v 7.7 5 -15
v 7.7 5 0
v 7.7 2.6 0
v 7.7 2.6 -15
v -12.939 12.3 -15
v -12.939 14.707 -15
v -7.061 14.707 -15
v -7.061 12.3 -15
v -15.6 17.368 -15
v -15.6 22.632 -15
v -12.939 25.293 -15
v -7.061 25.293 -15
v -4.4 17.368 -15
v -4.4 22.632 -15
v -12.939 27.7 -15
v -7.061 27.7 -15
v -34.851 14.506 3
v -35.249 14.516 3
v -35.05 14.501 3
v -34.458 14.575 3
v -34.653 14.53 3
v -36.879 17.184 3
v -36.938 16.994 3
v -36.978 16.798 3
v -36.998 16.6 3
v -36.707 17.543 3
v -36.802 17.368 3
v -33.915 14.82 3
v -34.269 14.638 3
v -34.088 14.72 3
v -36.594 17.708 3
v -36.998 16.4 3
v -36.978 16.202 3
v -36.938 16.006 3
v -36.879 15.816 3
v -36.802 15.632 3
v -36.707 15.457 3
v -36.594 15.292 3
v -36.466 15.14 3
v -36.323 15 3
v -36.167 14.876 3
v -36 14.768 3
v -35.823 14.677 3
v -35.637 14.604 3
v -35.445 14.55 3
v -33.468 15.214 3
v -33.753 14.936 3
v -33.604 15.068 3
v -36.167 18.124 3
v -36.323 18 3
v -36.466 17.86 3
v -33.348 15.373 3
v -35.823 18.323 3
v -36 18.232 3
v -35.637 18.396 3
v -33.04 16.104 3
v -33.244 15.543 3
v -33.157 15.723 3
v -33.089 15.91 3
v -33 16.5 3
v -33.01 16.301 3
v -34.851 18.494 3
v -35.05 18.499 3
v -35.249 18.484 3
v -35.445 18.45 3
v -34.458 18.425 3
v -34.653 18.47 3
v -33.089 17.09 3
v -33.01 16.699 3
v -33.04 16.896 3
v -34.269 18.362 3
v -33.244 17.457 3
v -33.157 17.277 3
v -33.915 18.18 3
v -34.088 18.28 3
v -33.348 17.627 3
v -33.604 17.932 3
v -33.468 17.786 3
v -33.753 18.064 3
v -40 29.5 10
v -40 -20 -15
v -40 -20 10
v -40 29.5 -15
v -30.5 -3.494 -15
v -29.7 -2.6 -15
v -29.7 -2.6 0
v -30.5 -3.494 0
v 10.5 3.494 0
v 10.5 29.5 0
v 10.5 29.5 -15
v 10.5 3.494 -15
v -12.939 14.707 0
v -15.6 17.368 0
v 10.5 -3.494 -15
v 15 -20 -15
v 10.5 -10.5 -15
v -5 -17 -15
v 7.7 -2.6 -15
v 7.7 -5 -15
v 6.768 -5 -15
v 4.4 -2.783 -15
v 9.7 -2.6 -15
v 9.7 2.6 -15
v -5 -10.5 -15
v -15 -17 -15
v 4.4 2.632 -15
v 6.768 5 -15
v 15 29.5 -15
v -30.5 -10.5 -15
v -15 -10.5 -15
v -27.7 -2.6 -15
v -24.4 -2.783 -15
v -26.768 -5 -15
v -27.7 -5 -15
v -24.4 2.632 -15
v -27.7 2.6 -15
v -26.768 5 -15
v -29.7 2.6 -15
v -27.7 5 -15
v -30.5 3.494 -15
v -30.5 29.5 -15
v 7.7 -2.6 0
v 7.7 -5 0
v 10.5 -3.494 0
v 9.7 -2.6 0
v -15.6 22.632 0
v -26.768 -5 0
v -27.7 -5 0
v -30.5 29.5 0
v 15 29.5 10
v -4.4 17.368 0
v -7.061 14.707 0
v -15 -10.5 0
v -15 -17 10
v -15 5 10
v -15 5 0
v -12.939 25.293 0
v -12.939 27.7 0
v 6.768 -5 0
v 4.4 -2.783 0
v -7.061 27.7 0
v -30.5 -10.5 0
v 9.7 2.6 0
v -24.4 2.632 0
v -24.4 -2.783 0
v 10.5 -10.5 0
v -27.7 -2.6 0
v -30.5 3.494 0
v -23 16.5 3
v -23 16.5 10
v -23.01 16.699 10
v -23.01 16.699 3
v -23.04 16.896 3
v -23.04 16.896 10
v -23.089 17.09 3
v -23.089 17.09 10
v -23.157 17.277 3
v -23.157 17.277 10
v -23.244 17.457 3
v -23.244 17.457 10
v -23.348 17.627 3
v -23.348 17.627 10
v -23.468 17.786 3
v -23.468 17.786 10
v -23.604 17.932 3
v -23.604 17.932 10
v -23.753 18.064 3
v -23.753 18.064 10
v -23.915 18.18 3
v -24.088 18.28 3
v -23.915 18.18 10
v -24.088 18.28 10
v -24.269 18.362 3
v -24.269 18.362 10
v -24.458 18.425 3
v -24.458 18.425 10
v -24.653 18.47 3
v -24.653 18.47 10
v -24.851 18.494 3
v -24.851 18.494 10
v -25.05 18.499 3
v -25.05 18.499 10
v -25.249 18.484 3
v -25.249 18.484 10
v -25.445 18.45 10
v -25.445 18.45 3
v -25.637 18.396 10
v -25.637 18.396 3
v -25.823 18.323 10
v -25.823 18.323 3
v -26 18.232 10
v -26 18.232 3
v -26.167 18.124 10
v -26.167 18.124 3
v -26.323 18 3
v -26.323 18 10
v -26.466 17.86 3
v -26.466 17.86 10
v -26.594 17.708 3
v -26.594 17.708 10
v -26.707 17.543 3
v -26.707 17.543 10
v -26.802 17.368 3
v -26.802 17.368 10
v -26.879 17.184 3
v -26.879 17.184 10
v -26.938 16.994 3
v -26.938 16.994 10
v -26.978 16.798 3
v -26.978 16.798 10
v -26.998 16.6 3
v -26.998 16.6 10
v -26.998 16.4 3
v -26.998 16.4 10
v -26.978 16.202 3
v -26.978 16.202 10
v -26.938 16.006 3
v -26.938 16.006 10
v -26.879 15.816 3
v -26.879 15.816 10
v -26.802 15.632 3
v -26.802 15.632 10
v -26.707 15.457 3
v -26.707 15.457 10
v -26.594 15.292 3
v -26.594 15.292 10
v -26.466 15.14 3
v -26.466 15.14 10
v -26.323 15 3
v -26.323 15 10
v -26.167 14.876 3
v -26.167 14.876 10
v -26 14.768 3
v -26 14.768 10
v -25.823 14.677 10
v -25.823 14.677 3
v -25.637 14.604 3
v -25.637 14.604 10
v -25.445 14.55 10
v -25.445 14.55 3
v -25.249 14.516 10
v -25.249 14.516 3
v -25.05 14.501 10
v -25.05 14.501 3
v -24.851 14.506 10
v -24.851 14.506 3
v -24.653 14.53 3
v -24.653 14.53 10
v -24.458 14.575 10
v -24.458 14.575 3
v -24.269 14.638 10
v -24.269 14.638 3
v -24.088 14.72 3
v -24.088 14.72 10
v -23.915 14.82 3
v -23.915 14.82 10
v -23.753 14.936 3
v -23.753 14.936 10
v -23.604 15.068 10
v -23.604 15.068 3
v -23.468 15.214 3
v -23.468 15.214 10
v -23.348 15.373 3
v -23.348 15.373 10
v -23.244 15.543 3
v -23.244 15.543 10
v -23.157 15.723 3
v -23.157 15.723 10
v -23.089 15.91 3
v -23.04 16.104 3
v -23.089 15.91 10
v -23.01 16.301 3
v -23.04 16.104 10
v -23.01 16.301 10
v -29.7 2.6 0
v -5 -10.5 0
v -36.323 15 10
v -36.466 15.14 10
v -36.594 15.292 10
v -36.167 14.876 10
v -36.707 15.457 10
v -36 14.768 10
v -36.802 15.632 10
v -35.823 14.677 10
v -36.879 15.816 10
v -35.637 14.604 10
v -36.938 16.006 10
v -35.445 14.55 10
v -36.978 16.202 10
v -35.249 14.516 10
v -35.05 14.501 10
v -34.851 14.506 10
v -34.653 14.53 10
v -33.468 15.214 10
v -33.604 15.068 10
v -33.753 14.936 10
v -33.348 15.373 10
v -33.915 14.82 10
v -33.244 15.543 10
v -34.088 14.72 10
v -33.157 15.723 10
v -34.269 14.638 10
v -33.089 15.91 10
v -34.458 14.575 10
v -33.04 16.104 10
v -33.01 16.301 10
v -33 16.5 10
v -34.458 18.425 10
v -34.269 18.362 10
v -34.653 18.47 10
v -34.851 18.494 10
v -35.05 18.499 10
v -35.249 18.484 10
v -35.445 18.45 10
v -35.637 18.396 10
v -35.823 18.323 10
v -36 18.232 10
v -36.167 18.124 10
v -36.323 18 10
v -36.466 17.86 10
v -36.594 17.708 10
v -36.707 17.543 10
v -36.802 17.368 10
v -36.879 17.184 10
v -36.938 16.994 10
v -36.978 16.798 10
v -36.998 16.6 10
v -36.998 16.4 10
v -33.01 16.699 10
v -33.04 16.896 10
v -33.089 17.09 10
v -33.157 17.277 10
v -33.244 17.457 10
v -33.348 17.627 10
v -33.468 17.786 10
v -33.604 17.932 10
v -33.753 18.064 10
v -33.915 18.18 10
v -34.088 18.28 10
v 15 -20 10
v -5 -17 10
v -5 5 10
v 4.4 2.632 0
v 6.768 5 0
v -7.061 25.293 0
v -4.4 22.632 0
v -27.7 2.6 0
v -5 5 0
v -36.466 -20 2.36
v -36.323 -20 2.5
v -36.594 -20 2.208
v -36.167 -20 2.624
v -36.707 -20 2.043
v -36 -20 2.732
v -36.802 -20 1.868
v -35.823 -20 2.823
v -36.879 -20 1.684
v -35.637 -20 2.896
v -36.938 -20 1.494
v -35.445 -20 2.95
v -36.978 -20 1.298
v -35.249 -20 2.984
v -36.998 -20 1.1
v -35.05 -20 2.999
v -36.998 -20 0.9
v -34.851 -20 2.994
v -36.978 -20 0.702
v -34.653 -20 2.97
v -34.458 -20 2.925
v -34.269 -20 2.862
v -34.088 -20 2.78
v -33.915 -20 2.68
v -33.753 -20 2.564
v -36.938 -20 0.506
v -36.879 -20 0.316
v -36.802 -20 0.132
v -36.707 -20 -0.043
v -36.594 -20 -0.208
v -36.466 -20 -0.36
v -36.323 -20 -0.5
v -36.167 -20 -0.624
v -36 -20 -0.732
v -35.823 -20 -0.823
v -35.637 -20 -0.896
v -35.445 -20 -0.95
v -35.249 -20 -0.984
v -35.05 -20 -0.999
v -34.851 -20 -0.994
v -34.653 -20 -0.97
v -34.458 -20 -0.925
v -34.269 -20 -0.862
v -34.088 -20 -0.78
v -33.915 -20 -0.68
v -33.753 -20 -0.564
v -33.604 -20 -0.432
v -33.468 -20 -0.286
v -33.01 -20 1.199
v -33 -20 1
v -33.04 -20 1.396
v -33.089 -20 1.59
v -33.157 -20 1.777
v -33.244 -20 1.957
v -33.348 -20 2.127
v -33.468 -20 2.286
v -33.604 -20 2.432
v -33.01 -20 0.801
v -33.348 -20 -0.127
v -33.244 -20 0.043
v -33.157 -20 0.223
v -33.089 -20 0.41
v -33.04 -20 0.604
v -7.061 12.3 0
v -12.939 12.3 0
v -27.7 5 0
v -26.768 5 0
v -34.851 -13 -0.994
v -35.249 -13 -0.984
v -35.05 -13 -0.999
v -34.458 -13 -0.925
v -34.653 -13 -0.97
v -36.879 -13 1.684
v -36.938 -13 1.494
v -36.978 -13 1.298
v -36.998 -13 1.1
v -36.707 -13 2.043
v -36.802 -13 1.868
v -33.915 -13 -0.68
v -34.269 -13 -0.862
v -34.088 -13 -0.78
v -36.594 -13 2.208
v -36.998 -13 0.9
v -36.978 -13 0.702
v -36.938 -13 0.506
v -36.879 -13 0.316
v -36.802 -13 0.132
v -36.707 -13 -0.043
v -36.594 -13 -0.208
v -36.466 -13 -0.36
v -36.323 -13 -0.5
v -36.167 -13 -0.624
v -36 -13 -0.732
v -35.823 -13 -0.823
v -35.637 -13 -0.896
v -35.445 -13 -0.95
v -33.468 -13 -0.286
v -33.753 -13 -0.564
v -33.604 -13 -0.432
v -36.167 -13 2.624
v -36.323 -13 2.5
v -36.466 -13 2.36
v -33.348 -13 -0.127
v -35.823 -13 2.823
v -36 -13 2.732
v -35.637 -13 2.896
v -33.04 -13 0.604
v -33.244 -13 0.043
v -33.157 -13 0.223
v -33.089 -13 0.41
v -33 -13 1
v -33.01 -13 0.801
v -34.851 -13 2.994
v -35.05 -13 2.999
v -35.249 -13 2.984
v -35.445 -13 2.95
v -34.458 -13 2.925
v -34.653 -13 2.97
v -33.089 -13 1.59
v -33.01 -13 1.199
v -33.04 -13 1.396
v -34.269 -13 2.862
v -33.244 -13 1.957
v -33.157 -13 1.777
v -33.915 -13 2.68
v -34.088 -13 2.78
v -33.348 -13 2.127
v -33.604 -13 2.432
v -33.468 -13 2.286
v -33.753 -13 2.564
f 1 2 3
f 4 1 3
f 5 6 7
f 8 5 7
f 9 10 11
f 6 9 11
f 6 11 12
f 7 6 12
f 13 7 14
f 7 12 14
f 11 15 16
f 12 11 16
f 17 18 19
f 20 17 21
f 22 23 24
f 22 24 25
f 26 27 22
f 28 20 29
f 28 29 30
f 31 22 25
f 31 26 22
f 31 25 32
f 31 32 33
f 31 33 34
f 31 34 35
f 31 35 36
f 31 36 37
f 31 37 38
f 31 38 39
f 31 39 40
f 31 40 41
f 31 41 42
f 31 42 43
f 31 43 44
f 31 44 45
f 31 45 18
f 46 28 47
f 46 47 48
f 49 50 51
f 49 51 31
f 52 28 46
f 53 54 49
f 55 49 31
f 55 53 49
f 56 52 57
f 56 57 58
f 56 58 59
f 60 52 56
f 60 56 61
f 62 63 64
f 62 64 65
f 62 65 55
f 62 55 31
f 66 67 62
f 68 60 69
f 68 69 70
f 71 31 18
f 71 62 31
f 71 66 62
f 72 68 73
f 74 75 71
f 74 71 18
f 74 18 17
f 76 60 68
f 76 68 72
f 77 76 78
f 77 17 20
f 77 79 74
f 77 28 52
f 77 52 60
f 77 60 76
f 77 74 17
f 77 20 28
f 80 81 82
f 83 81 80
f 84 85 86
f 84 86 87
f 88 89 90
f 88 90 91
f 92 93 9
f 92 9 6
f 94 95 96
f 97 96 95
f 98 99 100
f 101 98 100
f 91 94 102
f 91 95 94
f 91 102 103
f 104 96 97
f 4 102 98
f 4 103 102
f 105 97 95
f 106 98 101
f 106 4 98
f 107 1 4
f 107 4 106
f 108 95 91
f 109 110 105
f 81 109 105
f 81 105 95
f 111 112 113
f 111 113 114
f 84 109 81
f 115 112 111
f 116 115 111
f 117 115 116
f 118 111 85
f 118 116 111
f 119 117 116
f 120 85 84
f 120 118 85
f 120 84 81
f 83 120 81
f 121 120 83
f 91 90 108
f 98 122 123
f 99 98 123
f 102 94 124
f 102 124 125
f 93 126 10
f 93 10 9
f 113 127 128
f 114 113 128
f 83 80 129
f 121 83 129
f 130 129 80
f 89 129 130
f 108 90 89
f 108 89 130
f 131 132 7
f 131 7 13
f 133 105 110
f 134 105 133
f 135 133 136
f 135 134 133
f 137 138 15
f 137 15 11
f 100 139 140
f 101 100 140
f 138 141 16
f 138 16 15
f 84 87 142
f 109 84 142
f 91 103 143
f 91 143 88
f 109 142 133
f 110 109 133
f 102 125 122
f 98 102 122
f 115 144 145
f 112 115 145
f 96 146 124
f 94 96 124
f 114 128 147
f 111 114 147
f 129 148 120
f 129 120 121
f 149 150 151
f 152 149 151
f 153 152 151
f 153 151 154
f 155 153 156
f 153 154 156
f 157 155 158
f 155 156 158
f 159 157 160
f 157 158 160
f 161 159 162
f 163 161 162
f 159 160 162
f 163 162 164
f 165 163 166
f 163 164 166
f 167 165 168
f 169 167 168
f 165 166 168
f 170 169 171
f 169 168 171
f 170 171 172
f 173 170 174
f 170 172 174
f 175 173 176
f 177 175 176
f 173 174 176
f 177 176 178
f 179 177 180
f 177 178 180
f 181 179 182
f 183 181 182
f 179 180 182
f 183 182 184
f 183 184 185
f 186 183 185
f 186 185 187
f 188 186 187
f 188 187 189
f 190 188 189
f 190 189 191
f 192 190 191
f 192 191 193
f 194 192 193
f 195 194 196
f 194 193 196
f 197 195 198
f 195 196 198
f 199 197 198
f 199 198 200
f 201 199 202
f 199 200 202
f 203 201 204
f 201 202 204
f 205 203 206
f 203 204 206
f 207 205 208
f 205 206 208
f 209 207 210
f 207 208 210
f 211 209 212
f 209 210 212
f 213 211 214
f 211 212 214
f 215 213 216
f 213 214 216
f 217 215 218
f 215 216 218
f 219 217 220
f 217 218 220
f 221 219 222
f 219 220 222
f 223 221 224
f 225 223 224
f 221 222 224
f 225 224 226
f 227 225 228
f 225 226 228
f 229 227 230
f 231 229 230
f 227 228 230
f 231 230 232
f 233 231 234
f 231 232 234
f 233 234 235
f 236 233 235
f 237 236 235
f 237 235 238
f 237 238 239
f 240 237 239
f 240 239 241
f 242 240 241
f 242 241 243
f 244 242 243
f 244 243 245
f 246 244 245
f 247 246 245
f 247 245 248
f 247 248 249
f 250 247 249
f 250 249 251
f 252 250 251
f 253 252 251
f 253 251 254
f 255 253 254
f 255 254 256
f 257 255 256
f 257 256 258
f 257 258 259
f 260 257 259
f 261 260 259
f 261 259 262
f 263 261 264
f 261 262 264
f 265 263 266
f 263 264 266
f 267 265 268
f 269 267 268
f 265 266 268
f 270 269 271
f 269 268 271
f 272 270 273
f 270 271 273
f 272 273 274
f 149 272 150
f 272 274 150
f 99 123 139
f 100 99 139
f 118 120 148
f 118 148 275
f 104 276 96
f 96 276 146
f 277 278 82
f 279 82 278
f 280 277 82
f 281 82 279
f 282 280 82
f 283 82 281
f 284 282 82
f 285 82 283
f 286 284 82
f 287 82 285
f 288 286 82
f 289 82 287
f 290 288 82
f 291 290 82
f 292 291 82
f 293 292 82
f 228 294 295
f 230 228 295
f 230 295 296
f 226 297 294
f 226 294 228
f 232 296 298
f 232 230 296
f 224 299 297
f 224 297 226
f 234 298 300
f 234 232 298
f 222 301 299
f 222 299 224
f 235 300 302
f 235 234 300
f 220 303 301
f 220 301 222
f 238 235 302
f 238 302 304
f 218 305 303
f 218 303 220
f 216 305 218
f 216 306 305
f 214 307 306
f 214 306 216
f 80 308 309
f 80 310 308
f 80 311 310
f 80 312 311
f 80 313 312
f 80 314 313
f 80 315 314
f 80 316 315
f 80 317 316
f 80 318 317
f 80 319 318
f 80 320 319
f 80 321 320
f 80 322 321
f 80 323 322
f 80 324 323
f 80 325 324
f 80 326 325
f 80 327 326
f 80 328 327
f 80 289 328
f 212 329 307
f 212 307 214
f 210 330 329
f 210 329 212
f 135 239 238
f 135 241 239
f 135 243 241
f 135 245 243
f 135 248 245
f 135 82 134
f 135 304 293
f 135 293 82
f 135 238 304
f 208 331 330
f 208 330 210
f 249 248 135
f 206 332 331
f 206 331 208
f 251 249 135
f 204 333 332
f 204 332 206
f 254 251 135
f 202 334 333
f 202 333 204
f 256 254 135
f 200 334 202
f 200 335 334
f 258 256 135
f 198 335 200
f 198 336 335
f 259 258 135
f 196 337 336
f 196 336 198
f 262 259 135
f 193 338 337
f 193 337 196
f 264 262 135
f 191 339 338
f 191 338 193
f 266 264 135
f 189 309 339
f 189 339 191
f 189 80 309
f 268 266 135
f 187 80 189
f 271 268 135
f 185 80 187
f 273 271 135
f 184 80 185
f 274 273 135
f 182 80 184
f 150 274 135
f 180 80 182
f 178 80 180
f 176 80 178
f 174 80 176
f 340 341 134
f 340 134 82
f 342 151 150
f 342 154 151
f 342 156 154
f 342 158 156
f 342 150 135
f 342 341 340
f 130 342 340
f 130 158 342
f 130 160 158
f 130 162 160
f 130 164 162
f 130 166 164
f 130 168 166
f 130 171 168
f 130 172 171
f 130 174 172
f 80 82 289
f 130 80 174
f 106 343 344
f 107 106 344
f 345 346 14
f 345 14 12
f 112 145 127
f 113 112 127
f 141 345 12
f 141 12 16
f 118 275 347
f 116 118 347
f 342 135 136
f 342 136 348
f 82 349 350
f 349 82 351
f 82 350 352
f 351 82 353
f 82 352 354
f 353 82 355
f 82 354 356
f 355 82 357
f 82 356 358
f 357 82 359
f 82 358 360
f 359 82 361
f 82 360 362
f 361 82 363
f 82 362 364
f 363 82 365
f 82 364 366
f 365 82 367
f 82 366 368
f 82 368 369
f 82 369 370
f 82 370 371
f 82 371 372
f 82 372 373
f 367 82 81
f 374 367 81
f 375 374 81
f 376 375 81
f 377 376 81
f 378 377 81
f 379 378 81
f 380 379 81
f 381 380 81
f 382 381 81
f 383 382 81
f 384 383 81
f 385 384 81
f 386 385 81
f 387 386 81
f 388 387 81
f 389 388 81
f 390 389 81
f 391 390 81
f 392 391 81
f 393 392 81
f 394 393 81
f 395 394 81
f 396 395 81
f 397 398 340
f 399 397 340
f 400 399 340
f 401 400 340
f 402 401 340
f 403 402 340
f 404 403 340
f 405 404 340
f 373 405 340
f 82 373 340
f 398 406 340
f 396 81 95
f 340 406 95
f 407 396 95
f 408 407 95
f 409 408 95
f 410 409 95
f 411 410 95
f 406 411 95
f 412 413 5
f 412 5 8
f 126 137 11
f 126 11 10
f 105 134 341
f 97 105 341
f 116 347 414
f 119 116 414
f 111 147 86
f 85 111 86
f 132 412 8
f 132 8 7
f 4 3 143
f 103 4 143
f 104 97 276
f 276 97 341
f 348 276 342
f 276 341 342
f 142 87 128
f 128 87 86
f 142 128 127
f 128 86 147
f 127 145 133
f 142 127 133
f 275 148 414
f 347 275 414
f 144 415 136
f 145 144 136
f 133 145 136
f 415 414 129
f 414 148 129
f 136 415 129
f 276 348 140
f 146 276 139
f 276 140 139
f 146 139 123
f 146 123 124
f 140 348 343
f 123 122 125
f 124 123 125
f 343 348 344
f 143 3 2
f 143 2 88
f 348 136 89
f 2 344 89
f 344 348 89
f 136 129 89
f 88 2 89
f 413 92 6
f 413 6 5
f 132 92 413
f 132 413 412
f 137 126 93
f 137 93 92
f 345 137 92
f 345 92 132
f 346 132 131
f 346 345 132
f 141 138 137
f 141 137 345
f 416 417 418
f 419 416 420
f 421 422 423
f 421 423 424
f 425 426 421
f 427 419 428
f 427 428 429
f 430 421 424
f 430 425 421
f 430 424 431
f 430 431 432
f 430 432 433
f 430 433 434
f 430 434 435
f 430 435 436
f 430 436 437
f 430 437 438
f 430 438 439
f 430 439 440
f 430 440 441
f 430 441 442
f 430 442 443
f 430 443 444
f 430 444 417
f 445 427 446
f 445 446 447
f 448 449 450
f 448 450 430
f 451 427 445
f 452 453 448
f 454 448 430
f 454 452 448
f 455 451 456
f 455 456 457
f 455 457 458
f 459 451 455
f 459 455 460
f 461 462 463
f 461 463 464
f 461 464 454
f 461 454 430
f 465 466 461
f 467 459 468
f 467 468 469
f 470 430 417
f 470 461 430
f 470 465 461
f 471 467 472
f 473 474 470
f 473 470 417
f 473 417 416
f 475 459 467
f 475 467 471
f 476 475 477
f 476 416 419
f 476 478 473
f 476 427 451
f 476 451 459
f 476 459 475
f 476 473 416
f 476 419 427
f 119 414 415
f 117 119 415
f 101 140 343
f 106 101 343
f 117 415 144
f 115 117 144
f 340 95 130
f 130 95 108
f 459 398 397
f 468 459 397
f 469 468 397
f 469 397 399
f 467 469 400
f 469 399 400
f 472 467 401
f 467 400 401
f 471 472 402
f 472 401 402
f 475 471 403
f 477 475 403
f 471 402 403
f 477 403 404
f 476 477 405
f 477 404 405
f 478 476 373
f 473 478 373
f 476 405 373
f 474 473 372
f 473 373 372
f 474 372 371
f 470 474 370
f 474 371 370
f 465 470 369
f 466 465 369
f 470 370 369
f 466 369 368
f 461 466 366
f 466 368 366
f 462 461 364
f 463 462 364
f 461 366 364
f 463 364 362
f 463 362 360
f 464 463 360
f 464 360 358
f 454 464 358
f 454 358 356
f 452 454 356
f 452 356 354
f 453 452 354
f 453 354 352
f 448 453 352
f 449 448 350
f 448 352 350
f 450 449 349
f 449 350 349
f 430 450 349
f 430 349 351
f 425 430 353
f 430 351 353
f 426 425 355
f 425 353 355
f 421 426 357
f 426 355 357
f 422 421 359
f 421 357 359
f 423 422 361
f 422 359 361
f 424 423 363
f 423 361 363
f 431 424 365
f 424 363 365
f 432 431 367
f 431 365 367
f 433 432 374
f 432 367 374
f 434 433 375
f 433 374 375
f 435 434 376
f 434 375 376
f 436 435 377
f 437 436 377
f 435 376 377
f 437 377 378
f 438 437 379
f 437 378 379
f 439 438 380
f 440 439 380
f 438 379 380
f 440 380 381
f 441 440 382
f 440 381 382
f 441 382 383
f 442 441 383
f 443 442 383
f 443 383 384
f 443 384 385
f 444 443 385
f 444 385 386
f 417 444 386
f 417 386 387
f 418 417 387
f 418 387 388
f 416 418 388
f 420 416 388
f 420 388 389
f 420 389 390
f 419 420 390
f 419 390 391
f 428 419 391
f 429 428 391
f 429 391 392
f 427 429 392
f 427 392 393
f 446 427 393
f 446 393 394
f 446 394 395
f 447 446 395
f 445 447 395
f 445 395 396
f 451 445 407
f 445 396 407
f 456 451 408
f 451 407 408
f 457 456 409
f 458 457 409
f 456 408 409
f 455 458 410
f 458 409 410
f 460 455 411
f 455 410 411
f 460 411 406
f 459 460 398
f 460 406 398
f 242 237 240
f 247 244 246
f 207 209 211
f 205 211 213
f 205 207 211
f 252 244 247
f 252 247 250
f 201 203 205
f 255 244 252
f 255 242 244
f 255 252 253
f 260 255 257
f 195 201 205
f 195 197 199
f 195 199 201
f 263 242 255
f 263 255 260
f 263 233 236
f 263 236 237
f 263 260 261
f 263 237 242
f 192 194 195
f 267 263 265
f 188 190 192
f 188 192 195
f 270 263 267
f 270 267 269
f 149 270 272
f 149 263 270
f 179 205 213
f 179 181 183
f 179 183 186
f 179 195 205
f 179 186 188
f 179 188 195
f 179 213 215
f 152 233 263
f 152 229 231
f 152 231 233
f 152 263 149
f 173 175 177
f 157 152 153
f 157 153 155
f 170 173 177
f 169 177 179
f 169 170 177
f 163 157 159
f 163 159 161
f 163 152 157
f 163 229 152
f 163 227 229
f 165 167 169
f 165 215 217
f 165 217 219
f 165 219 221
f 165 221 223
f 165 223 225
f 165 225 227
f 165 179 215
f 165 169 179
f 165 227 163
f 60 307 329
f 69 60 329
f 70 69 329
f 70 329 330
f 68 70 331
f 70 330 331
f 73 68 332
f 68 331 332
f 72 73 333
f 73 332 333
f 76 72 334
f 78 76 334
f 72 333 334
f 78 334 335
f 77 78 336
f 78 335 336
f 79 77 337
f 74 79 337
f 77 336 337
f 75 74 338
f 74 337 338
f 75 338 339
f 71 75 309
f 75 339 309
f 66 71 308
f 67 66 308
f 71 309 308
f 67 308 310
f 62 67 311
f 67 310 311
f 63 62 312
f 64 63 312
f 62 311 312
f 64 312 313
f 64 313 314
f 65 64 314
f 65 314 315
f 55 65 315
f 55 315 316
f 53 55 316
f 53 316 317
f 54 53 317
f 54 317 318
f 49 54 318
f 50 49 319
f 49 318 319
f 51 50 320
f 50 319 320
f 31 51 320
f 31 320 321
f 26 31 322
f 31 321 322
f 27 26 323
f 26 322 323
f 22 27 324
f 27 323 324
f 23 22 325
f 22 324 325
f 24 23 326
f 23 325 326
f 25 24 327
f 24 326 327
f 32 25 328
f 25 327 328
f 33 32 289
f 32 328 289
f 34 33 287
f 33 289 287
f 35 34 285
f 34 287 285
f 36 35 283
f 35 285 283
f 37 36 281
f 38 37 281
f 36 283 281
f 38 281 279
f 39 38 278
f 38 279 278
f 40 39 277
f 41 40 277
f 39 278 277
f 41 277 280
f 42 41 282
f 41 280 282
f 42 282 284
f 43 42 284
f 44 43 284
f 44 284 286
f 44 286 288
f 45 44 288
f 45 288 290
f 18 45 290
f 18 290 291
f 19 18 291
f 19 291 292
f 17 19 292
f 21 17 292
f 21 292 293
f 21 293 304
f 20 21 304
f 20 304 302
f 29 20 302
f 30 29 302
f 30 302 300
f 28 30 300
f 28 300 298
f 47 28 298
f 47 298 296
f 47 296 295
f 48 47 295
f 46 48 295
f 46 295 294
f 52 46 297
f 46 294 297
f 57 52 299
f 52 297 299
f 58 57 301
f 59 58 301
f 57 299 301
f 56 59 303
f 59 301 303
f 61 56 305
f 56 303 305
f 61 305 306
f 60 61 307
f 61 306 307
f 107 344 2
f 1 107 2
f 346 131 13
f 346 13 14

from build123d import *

# Parameters (mm, degrees)
BOSS_EXTRUDE1_DEPTH = 15
SKETCH3_W           = 55
SKETCH3_H           = 49.5
BOSS_EXTRUDE2_DEPTH = 10
BOSS_EXTRUDE3_DEPTH = 15
SKETCH5_R           = 2
CUT_EXTRUDE1_DEPTH  = 7
SKETCH6_R           = 2
CUT_EXTRUDE2_DEPTH  = 7
SKETCH7_W           = 10
SKETCH7_H           = 22
CUT_EXTRUDE3_DEPTH  = 43


with BuildPart() as part:
    # Sketch1 → Boss-Extrude1 (new body)
    with BuildSketch(Plane.XY):
        Polygon((15, -20), (-40, -20), (-40, 29.5), (-30.5, 29.5), (-30.5, 10), (-30.5, 3.494427191), (-29.7, 2.6), (-27.7, 2.6), (-27.7, 5), (-26.767766953, 5), (-24.4, 2.632233047), (-24.4, -2.783060843), (-26.767766953, -5), (-27.7, -5), (-27.7, -2.6), (-29.7, -2.6), (-30.5, -3.494427191), (-30.5, -10.5), (10.5, -10.5), (10.5, -3.494427191), (9.7, -2.6), (7.7, -2.6), (7.7, -5), (6.767766953, -5), (4.4, -2.783060843), (4.4, 2.632233047), (6.767766953, 5), (7.7, 5), (7.7, 2.6), (9.7, 2.6), (10.5, 3.494427191), (10.5, 10), (10.5, 29.5), (15, 29.5), align=None)
    extrude(amount=-BOSS_EXTRUDE1_DEPTH)

    # Sketch3 → Boss-Extrude2 (add)
    with BuildSketch(Plane.XY):
        with Locations((-12.5, 4.75)):
            Rectangle(SKETCH3_W, SKETCH3_H)
    extrude(amount=BOSS_EXTRUDE2_DEPTH)

    # Sketch5 → Cut-Extrude1 (cut)
    with BuildSketch(Plane.XY.offset(10)):
        with Locations((-35, 16.5)):
            Circle(SKETCH5_R)
        with Locations((-25, 16.5)):
            Circle(SKETCH5_R)
    extrude(amount=-CUT_EXTRUDE1_DEPTH, mode=Mode.SUBTRACT)

    # Sketch6 → Cut-Extrude2 (cut)
    with BuildSketch(Plane(origin=(0, -20, 0), x_dir=(-1, 0, 0), z_dir=(0, -1, 0))):
        with Locations(Location((35, -1, 0), (0, 0, 180))):
            Circle(SKETCH6_R)
    extrude(amount=-CUT_EXTRUDE2_DEPTH, mode=Mode.SUBTRACT)

    # Sketch7 → Cut-Extrude3 (cut)
    with BuildSketch(Plane.XY.offset(10)):
        with Locations((-10, -6)):
            Rectangle(SKETCH7_W, SKETCH7_H)
    extrude(amount=-CUT_EXTRUDE3_DEPTH, mode=Mode.SUBTRACT)


with BuildPart() as body_2:
    # Sketch4 → Boss-Extrude3 (new body)
    with BuildSketch(Plane(origin=(0, 0, 0), x_dir=(-1, 0, 0), z_dir=(0, 0, -1))):
        Polygon((12.939339828, 25.292893219), (15.6, 22.632233047), (15.6, 17.367766953), (12.939339828, 14.707106781), (12.939339828, 12.3), (7.060660172, 12.3), (7.060660172, 14.707106781), (4.4, 17.367766953), (4.4, 22.632233047), (7.060660172, 25.292893219), (7.060660172, 27.7), (12.939339828, 27.7), align=None)
    extrude(amount=BOSS_EXTRUDE3_DEPTH)


solid = Compound([part.part, body_2.part])
